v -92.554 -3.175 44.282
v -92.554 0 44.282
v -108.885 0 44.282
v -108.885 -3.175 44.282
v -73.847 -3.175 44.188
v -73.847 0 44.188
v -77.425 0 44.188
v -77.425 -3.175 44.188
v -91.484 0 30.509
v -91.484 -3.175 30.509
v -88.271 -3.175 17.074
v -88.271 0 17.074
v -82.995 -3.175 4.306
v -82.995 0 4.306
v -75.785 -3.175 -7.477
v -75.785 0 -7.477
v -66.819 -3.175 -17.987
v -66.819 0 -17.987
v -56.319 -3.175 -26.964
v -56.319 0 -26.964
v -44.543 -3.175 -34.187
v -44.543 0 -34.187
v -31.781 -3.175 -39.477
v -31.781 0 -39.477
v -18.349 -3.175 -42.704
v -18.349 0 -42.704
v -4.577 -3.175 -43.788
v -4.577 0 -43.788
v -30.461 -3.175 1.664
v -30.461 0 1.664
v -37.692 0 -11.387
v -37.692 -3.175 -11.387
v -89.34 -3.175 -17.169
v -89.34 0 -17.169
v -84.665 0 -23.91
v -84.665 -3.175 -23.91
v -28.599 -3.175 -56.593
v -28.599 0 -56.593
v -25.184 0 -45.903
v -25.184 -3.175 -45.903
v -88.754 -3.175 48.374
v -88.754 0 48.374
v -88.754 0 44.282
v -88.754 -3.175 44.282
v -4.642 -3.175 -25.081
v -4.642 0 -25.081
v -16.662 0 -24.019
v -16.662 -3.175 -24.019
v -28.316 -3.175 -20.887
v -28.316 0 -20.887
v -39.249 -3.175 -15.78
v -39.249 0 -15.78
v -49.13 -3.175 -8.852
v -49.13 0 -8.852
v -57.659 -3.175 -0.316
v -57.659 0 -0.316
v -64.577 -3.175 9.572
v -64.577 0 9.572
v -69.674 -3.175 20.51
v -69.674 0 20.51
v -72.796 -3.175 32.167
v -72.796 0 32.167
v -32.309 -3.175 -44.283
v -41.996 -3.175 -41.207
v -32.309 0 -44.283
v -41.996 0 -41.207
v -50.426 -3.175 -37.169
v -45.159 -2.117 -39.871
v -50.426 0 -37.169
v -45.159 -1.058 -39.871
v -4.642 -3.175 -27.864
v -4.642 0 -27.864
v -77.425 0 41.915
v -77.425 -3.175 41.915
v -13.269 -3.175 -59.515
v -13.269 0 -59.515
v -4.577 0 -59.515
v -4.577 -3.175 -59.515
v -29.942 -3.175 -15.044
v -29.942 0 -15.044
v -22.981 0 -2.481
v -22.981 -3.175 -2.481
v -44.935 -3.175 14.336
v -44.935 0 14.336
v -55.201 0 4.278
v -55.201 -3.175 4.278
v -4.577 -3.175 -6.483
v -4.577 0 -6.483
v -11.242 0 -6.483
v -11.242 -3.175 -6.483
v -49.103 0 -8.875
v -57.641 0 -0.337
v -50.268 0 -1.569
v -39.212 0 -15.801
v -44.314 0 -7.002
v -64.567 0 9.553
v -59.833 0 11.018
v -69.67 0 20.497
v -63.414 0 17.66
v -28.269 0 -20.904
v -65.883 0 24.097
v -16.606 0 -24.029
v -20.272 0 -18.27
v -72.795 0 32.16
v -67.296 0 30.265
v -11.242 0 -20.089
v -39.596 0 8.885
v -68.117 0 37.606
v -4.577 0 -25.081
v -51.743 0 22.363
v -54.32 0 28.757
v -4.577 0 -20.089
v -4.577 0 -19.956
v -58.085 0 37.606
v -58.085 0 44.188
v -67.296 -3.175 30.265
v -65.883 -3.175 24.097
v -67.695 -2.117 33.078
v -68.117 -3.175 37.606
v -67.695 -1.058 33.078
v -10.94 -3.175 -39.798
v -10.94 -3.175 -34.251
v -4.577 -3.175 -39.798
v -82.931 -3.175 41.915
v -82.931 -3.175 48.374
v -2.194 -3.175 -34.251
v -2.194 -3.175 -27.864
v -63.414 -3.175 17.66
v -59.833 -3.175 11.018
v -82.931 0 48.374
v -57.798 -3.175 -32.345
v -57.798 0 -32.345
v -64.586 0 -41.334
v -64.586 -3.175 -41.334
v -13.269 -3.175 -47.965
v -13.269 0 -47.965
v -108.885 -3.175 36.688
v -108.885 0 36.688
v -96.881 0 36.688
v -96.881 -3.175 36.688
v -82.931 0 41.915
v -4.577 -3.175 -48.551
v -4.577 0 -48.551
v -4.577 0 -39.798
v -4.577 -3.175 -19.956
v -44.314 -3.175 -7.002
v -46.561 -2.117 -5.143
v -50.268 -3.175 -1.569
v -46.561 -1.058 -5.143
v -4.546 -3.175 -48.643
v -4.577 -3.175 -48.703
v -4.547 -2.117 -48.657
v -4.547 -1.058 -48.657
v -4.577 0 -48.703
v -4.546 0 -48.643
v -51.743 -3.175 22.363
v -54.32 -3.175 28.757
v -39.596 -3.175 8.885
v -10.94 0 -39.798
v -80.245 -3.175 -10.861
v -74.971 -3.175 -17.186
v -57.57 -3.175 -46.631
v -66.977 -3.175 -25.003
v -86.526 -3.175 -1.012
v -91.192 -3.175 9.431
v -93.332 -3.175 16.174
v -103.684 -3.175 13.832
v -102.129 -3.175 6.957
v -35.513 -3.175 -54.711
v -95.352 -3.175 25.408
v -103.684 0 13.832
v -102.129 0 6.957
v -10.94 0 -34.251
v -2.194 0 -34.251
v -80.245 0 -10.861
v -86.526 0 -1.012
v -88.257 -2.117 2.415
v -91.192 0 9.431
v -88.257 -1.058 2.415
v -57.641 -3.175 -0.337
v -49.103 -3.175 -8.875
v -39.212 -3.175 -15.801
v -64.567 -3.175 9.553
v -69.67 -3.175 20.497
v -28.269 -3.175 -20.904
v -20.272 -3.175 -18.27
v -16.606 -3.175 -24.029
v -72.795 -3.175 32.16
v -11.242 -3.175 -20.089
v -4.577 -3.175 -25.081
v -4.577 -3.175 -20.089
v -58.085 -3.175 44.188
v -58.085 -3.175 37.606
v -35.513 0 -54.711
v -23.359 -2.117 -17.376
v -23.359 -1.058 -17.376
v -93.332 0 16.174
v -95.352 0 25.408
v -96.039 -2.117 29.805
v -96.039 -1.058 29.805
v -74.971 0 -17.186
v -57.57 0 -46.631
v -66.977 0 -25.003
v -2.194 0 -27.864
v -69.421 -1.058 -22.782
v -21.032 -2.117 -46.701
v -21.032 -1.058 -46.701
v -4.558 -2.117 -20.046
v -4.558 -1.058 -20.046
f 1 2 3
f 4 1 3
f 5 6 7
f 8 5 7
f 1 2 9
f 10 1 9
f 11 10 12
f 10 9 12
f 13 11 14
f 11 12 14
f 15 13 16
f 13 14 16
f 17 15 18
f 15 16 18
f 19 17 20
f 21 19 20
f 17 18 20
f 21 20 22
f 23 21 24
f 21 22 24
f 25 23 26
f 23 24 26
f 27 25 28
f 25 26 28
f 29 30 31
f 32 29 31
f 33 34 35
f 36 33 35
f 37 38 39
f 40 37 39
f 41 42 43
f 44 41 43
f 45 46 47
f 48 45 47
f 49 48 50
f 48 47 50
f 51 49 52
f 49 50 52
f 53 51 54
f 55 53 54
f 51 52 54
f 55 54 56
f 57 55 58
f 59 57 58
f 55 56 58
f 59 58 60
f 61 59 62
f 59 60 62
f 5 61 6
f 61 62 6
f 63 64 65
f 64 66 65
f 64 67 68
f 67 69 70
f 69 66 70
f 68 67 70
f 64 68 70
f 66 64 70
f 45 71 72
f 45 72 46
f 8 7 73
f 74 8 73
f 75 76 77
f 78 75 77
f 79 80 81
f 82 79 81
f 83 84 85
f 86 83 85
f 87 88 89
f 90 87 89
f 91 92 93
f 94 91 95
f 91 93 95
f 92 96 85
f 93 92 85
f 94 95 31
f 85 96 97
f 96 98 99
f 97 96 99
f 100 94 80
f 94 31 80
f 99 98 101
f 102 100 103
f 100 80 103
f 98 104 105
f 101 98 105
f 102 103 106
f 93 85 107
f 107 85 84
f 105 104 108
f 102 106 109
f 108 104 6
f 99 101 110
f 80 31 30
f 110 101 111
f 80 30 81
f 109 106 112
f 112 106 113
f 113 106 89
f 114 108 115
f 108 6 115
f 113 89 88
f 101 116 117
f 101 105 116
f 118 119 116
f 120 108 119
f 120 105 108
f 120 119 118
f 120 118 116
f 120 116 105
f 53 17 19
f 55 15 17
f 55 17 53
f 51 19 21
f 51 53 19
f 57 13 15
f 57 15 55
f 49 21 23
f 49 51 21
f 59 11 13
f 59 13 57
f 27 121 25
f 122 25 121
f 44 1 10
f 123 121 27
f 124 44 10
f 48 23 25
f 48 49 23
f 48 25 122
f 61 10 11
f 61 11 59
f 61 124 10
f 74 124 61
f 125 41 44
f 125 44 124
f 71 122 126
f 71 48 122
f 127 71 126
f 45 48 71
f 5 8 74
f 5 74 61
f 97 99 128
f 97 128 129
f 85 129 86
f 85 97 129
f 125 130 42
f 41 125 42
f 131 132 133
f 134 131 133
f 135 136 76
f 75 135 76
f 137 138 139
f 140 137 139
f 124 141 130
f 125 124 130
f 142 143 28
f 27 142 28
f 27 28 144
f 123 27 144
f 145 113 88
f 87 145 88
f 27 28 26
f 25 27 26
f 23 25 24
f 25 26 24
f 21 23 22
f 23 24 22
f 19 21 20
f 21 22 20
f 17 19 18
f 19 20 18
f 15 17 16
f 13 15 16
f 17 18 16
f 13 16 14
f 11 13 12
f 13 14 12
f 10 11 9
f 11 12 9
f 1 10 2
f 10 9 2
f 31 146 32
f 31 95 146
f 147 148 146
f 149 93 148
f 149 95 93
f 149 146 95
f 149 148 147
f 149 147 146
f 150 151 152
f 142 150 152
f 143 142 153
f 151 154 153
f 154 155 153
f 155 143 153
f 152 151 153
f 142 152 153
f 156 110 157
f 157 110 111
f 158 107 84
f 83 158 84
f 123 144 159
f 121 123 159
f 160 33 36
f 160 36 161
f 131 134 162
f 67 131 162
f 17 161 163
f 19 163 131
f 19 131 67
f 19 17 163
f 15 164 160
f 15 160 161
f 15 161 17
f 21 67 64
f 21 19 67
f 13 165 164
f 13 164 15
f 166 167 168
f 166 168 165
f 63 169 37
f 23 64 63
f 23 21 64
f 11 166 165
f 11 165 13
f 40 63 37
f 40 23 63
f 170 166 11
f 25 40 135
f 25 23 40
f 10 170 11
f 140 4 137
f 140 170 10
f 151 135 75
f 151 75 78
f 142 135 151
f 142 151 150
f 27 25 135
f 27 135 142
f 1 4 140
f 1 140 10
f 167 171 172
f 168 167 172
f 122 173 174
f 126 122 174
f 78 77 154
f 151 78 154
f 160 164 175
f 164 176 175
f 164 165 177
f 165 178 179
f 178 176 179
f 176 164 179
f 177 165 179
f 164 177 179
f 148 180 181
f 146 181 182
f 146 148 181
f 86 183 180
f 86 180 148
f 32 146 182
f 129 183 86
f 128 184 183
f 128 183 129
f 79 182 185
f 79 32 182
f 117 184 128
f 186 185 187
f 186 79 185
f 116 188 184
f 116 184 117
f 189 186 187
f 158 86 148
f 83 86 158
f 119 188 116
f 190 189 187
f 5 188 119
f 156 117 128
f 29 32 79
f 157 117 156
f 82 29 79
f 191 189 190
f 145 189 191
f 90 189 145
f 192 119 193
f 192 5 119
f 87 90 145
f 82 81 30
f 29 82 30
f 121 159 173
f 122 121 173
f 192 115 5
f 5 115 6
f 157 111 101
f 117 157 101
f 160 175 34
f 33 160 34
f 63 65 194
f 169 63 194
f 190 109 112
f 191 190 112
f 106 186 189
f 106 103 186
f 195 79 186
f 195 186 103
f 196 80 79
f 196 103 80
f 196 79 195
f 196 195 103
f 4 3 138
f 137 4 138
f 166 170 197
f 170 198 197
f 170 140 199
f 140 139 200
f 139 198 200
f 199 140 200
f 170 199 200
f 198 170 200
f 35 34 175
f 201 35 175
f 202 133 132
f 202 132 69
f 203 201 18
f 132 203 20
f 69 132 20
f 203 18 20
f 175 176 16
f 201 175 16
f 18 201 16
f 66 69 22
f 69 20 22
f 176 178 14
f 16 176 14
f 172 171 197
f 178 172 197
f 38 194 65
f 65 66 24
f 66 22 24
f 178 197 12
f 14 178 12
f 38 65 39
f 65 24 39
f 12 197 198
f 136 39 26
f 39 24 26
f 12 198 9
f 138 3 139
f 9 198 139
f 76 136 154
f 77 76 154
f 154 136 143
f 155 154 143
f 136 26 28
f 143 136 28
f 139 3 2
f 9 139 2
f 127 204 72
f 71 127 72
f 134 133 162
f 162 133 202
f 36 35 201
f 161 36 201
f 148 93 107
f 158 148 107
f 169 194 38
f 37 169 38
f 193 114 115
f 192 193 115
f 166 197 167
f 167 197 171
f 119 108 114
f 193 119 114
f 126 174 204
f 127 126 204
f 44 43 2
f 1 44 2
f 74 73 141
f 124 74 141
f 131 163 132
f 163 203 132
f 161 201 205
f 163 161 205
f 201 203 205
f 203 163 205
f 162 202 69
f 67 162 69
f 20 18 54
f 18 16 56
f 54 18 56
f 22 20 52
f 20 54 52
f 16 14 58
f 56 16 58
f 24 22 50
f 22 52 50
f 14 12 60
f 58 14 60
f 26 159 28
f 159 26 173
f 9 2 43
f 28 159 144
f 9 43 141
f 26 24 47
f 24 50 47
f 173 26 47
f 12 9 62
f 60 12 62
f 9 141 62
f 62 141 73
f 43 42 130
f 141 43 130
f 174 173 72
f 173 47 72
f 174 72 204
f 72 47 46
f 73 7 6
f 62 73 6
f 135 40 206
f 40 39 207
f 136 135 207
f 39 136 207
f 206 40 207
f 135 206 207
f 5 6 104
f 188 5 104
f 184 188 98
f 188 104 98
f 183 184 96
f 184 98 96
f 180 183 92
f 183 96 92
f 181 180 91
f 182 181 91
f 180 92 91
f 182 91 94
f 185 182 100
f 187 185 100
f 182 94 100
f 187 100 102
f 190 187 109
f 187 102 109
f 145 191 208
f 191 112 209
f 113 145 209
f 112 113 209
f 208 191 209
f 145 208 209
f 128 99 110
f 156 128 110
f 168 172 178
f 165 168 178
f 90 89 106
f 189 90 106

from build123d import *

# Parameters (mm, degrees)
F1_DEPTH = 3.175
F3_DEPTH = 3.175


# Not quite as in the source:
# - ends of sketch curves that miss each other by under 0.0002 mm in the source are joined


with BuildPart() as f1:
    # F0 (on Front) → F1 (new body)
    with BuildSketch(Plane.XZ):
        with BuildLine():
            ThreePointArc((-4.57723355, -43.7883980573), (-66.819423743, -17.9873487673), (-92.5539227851, 44.2823866067))
            Line((-92.5539227851, 44.2823866067), (-97.6339227851, 44.2823866067))
            add(Edge.make_bspline(
                [(-97.6339227851, 44.2823866067), (-97.3931684107, 41.7497203339), (-97.1524140363, 39.2170540611), (-96.8805696251, 36.6884975094)],
                knots=[0, 0, 0, 0, 0.0522468531, 0.0522468531, 0.0522468531, 0.0522468531], degree=3))
            add(Edge.make_bspline(
                [(-96.8805696251, 36.6884975094), (-96.1391179528, 29.7918963404), (-95.1663820006, 22.9258681136), (-93.3315372634, 16.1738000838)],
                knots=[0.0522468531, 0.0522468531, 0.0522468531, 0.0522468531, 0.194749384, 0.194749384, 0.194749384, 0.194749384], degree=3))
            add(Edge.make_bspline(
                [(-93.3315372634, 16.1738000838), (-92.7163937389, 13.910125757), (-92.0043518732, 11.6592602013), (-91.1919757647, 9.4312911762)],
                knots=[0.194749384, 0.194749384, 0.194749384, 0.194749384, 0.242524276, 0.242524276, 0.242524276, 0.242524276], degree=3))
            add(Edge.make_bspline(
                [(-91.1919757647, 9.4312911762), (-88.6009408677, 2.3252901097), (-84.9892452149, -4.5477935635), (-80.2454108338, -10.8606620469)],
                knots=[0.242524276, 0.242524276, 0.242524276, 0.242524276, 0.394900018, 0.394900018, 0.394900018, 0.394900018], degree=3))
            add(Edge.make_bspline(
                [(-80.2454108338, -10.8606620469), (-78.607242384, -13.0406584688), (-76.8340664871, -15.1538492769), (-74.9712769181, -17.1861090489)],
                knots=[0.394900018, 0.394900018, 0.394900018, 0.394900018, 0.4475192945, 0.4475192945, 0.4475192945, 0.4475192945], degree=3))
            add(Edge.make_bspline(
                [(-74.9712769181, -17.1861090489), (-69.6272612199, -23.016304958), (-63.5457113797, -28.1804261391), (-57.7984134089, -32.3449592406)],
                knots=[0.4475192945, 0.4475192945, 0.4475192945, 0.4475192945, 0.5984747456, 0.5984747456, 0.5984747456, 0.5984747456], degree=3))
            add(Edge.make_bspline(
                [(-57.7984134089, -32.3449592406), (-55.3415292823, -34.1252350021), (-52.9457275098, -35.7228425466), (-50.4258841879, -37.168898271)],
                knots=[0.5984747456, 0.5984747456, 0.5984747456, 0.5984747456, 0.6630059486, 0.6630059486, 0.6630059486, 0.6630059486], degree=3))
            add(Edge.make_bspline(
                [(-50.4258841879, -37.168898271), (-45.3798949167, -40.0646265916), (-39.8364976619, -42.3526304388), (-32.3091378654, -44.2827760941)],
                knots=[0.6630059486, 0.6630059486, 0.6630059486, 0.6630059486, 0.7922297598, 0.7922297598, 0.7922297598, 0.7922297598], degree=3))
            add(Edge.make_bspline(
                [(-32.3091378654, -44.2827760941), (-30.0596561185, -44.8595822437), (-27.6329950376, -45.4044295862), (-25.1835874199, -45.9026667789)],
                knots=[0.7922297598, 0.7922297598, 0.7922297598, 0.7922297598, 0.8308470987, 0.8308470987, 0.8308470987, 0.8308470987], degree=3))
            add(Edge.make_bspline(
                [(-25.1835874199, -45.9026667789), (-21.0258896893, -46.7483894877), (-16.802653084, -47.4598158509), (-13.2691699484, -47.9652898008)],
                knots=[0.8308470987, 0.8308470987, 0.8308470987, 0.8308470987, 0.8963973245, 0.8963973245, 0.8963973245, 0.8963973245], degree=3))
            add(Edge.make_bspline(
                [(-13.2691699484, -47.9652898008), (-8.4519136222, -48.6544108435), (-4.916655331, -48.9607420913), (-4.57723355, -48.70271393)],
                knots=[0.8963973245, 0.8963973245, 0.8963973245, 0.8963973245, 0.9857630376, 0.9857630376, 0.9857630376, 0.9857630376], degree=3))
            Line((-4.57723355, -48.70271393), (-4.57723355, -48.5507466091))
            Line((-4.57723355, -48.5507466091), (-4.57723355, -43.7883980573))
        make_face()
        with BuildLine():
            add(Edge.make_bspline(
                [(-97.6339227851, 44.2823866067), (-97.3931684107, 41.7497203339), (-97.1524140363, 39.2170540611), (-96.8805696251, 36.6884975094)],
                knots=[0, 0, 0, 0, 0.0522468531, 0.0522468531, 0.0522468531, 0.0522468531], degree=3))
            Line((-97.6339227851, 44.2823866067), (-108.8849874868, 44.2823866067))
            Line((-108.8849874868, 44.2823866067), (-108.8849874868, 36.6884975094))
            Line((-108.8849874868, 36.6884975094), (-96.8805696251, 36.6884975094))
        make_face()
        with BuildLine():
            add(Edge.make_bspline(
                [(-4.57723355, -48.70271393), (-4.5231598458, -48.6616071441), (-4.5501966979, -48.6061768766), (-4.57723355, -48.5507466091)],
                knots=[0.9857630376, 0.9857630376, 0.9857630376, 0.9857630376, 1, 1, 1, 1], degree=3))
            Line((-4.57723355, -48.5507466091), (-4.57723355, -48.70271393))
        make_face()
        with BuildLine():
            Line((-4.57723355, -59.5153173973), (-4.57723355, -48.70271393))
            add(Edge.make_bspline(
                [(-13.2691699484, -47.9652898008), (-8.4519136222, -48.6544108435), (-4.916655331, -48.9607420913), (-4.57723355, -48.70271393)],
                knots=[0.8963973245, 0.8963973245, 0.8963973245, 0.8963973245, 0.9857630376, 0.9857630376, 0.9857630376, 0.9857630376], degree=3))
            Line((-13.2691699484, -47.9652898008), (-13.2691699484, -59.5153173973))
            Line((-13.2691699484, -59.5153173973), (-4.57723355, -59.5153173973))
        make_face()
        with BuildLine():
            add(Edge.make_bspline(
                [(-93.3315372634, 16.1738000838), (-92.7163937389, 13.910125757), (-92.0043518732, 11.6592602013), (-91.1919757647, 9.4312911762)],
                knots=[0.194749384, 0.194749384, 0.194749384, 0.194749384, 0.242524276, 0.242524276, 0.242524276, 0.242524276], degree=3))
            Line((-93.3315372634, 16.1738000838), (-103.6843064573, 13.8317355646))
            Line((-103.6843064573, 13.8317355646), (-102.1290715587, 6.9570368465))
            Line((-102.1290715587, 6.9570368465), (-91.1919757647, 9.4312911762))
        make_face()
        with BuildLine():
            Line((-28.5986802118, -56.592917115), (-25.1835874199, -45.9026667789))
            add(Edge.make_bspline(
                [(-32.3091378654, -44.2827760941), (-30.0596561185, -44.8595822437), (-27.6329950376, -45.4044295862), (-25.1835874199, -45.9026667789)],
                knots=[0.7922297598, 0.7922297598, 0.7922297598, 0.7922297598, 0.8308470987, 0.8308470987, 0.8308470987, 0.8308470987], degree=3))
            Line((-32.3091378654, -44.2827760941), (-35.5125362565, -54.710556085))
            Line((-35.5125362565, -54.710556085), (-28.5986802118, -56.592917115))
        make_face()
        with BuildLine():
            add(Edge.make_bspline(
                [(-80.2454108338, -10.8606620469), (-78.607242384, -13.0406584688), (-76.8340664871, -15.1538492769), (-74.9712769181, -17.1861090489)],
                knots=[0.394900018, 0.394900018, 0.394900018, 0.394900018, 0.4475192945, 0.4475192945, 0.4475192945, 0.4475192945], degree=3))
            Line((-80.2454108338, -10.8606620469), (-89.3403956863, -17.1692187548))
            Line((-89.3403956863, -17.1692187548), (-84.6648700593, -23.9098785797))
            Line((-84.6648700593, -23.9098785797), (-74.9712769181, -17.1861090489))
        make_face()
        with BuildLine():
            Line((-57.5702740184, -46.6306970593), (-50.4258841879, -37.168898271))
            add(Edge.make_bspline(
                [(-57.7984134089, -32.3449592406), (-55.3415292823, -34.1252350021), (-52.9457275098, -35.7228425466), (-50.4258841879, -37.168898271)],
                knots=[0.5984747456, 0.5984747456, 0.5984747456, 0.5984747456, 0.6630059486, 0.6630059486, 0.6630059486, 0.6630059486], degree=3))
            Line((-57.7984134089, -32.3449592406), (-64.5855489224, -41.3336219678))
            Line((-64.5855489224, -41.3336219678), (-57.5702740184, -46.6306970593))
        make_face()
    extrude(amount=F1_DEPTH)


with BuildPart() as f1b:
    # F0 (on Front) → F1, piece 2 (new body)
    with BuildSketch(Plane.XZ):
        with BuildLine():
            Line((-68.460035245, 44.188341444), (-73.8470553452, 44.188341444))
            ThreePointArc((-73.8470553452, 44.188341444), (-53.5583942729, -4.792819279), (-4.57723355, -25.0814803512))
            Line((-4.57723355, -25.0814803512), (-4.57723355, -20.089340043))
            add(Edge.make_bspline(
                [(-11.2417986909, -20.089340043), (-7.6185165541, -20.5216548463), (-4.8185609122, -20.3880627705), (-4.57723355, -20.089340043)],
                knots=[0.8679520206, 0.8679520206, 0.8679520206, 0.8679520206, 0.9836335446, 0.9836335446, 0.9836335446, 0.9836335446], degree=3))
            add(Edge.make_bspline(
                [(-29.9419627206, -15.043763619), (-23.422756241, -17.6607776775), (-16.4738824823, -19.4650697847), (-11.2417986909, -20.089340043)],
                knots=[0.7009058442, 0.7009058442, 0.7009058442, 0.7009058442, 0.8679520206, 0.8679520206, 0.8679520206, 0.8679520206], degree=3))
            add(Edge.make_bspline(
                [(-37.6919303949, -11.3869210218), (-35.2854498907, -12.7286211423), (-32.6507981172, -13.9563520855), (-29.9419627206, -15.043763619)],
                knots=[0.6314954647, 0.6314954647, 0.6314954647, 0.6314954647, 0.7009058442, 0.7009058442, 0.7009058442, 0.7009058442], degree=3))
            add(Edge.make_bspline(
                [(-50.2679967336, -1.5694799865), (-46.7502062379, -5.2841732571), (-42.7188946441, -8.5842062158), (-37.6919303949, -11.3869210218)],
                knots=[0.486502187, 0.486502187, 0.486502187, 0.486502187, 0.6314954647, 0.6314954647, 0.6314954647, 0.6314954647], degree=3))
            add(Edge.make_bspline(
                [(-55.2009748713, 4.2784686576), (-53.6443043314, 2.2331240714), (-52.019825963, 0.2804051212), (-50.2679967336, -1.5694799865)],
                knots=[0.4142967892, 0.4142967892, 0.4142967892, 0.4142967892, 0.486502187, 0.486502187, 0.486502187, 0.486502187], degree=3))
            add(Edge.make_bspline(
                [(-63.4136220682, 17.660311036), (-61.2402617068, 12.9621183463), (-58.3602666711, 8.429533519), (-55.2009748713, 4.2784686576)],
                knots=[0.2677545922, 0.2677545922, 0.2677545922, 0.2677545922, 0.4142967892, 0.4142967892, 0.4142967892, 0.4142967892], degree=3))
            add(Edge.make_bspline(
                [(-65.8834584942, 24.0971257956), (-65.2299828846, 21.9310450164), (-64.3936435193, 19.7788412618), (-63.4136220682, 17.660311036)],
                knots=[0.2016751241, 0.2016751241, 0.2016751241, 0.2016751241, 0.2677545922, 0.2677545922, 0.2677545922, 0.2677545922], degree=3))
            add(Edge.make_bspline(
                [(-68.1166645486, 37.6055160739), (-67.7985284224, 33.0703711751), (-67.2281449465, 28.5543686299), (-65.8834584942, 24.0971257956)],
                knots=[0.0657004003, 0.0657004003, 0.0657004003, 0.0657004003, 0.2016751241, 0.2016751241, 0.2016751241, 0.2016751241], degree=3))
            add(Edge.make_bspline(
                [(-68.460035245, 44.188341444), (-68.3652085595, 41.992576638), (-68.270381874, 39.7968118321), (-68.1166645486, 37.6055160739)],
                knots=[0, 0, 0, 0, 0.0657004003, 0.0657004003, 0.0657004003, 0.0657004003], degree=3))
        make_face()
        with BuildLine():
            Line((-58.0849874868, 44.188341444), (-68.460035245, 44.188341444))
            add(Edge.make_bspline(
                [(-68.460035245, 44.188341444), (-68.3652085595, 41.992576638), (-68.270381874, 39.7968118321), (-68.1166645486, 37.6055160739)],
                knots=[0, 0, 0, 0, 0.0657004003, 0.0657004003, 0.0657004003, 0.0657004003], degree=3))
            Line((-68.1166645486, 37.6055160739), (-58.0849874868, 37.6055160739))
            Line((-58.0849874868, 37.6055160739), (-58.0849874868, 44.188341444))
        make_face()
        with BuildLine():
            add(Edge.make_bspline(
                [(-11.2417986909, -20.089340043), (-7.6185165541, -20.5216548463), (-4.8185609122, -20.3880627705), (-4.57723355, -20.089340043)],
                knots=[0.8679520206, 0.8679520206, 0.8679520206, 0.8679520206, 0.9836335446, 0.9836335446, 0.9836335446, 0.9836335446], degree=3))
            Line((-4.57723355, -20.089340043), (-4.57723355, -19.9559408889))
            Line((-4.57723355, -19.9559408889), (-4.57723355, -6.4825667786))
            Line((-4.57723355, -6.4825667786), (-11.2417986909, -6.4825667786))
            Line((-11.2417986909, -6.4825667786), (-11.2417986909, -20.089340043))
        make_face()
        with BuildLine():
            Line((-4.57723355, -19.9559408889), (-4.57723355, -20.089340043))
            add(Edge.make_bspline(
                [(-4.57723355, -20.089340043), (-4.5430909024, -20.0470771818), (-4.5601622262, -20.0015090354), (-4.57723355, -19.9559408889)],
                knots=[0.9836335446, 0.9836335446, 0.9836335446, 0.9836335446, 1, 1, 1, 1], degree=3))
        make_face()
        with BuildLine():
            Line((-54.3195477878, 28.7565803399), (-65.8834584942, 24.0971257956))
            add(Edge.make_bspline(
                [(-65.8834584942, 24.0971257956), (-65.2299828846, 21.9310450164), (-64.3936435193, 19.7788412618), (-63.4136220682, 17.660311036)],
                knots=[0.2016751241, 0.2016751241, 0.2016751241, 0.2016751241, 0.2677545922, 0.2677545922, 0.2677545922, 0.2677545922], degree=3))
            Line((-63.4136220682, 17.660311036), (-51.7432430301, 22.3626649389))
            Line((-51.7432430301, 22.3626649389), (-54.3195477878, 28.7565803399))
        make_face()
        with BuildLine():
            add(Edge.make_bspline(
                [(-37.6919303949, -11.3869210218), (-35.2854498907, -12.7286211423), (-32.6507981172, -13.9563520855), (-29.9419627206, -15.043763619)],
                knots=[0.6314954647, 0.6314954647, 0.6314954647, 0.6314954647, 0.7009058442, 0.7009058442, 0.7009058442, 0.7009058442], degree=3))
            Line((-29.9419627206, -15.043763619), (-22.9809752827, -2.4805746691))
            Line((-22.9809752827, -2.4805746691), (-30.460795653, 1.6638297367))
            Line((-30.460795653, 1.6638297367), (-37.6919303949, -11.3869210218))
        make_face()
        with BuildLine():
            Line((-44.9346528444, 14.3355632134), (-55.2009748713, 4.2784686576))
            add(Edge.make_bspline(
                [(-55.2009748713, 4.2784686576), (-53.6443043314, 2.2331240714), (-52.019825963, 0.2804051212), (-50.2679967336, -1.5694799865)],
                knots=[0.4142967892, 0.4142967892, 0.4142967892, 0.4142967892, 0.486502187, 0.486502187, 0.486502187, 0.486502187], degree=3))
            Line((-50.2679967336, -1.5694799865), (-39.5955882998, 8.8854249421))
            Line((-39.5955882998, 8.8854249421), (-44.9346528444, 14.3355632134))
        make_face()
    extrude(amount=F1_DEPTH)


with BuildPart() as f3:
    # F2 (on Front) → F3 (new body)
    with BuildSketch(Plane.XZ):
        with BuildLine():
            Line((-88.7539610267, 44.2823866067), (-92.5539227851, 44.2823866067))
            ThreePointArc((-92.5539227851, 44.2823866067), (-66.819423743, -17.9873487673), (-4.57723355, -43.7883980573))
            Line((-4.57723355, -43.7883980573), (-4.57723355, -39.7976860404))
            Line((-4.57723355, -39.7976860404), (-10.9395096079, -39.7976860404))
            Line((-10.9395096079, -39.7976860404), (-10.9395096079, -34.2512689531))
            Line((-10.9395096079, -34.2512689531), (-2.193643013, -34.2512689531))
            Line((-2.193643013, -34.2512689531), (-2.193643013, -27.864491567))
            Line((-2.193643013, -27.864491567), (-4.6415692195, -27.864491567))
            Line((-4.6415692195, -27.864491567), (-4.6415692195, -25.0813551247))
            ThreePointArc((-4.6415692195, -25.0813551247), (-53.5811351193, -4.7700678696), (-73.8470553452, 44.188341444))
            Line((-73.8470553452, 44.188341444), (-77.4248614907, 44.188341444))
            Line((-77.4248614907, 44.188341444), (-77.4248614907, 41.9153422117))
            Line((-77.4248614907, 41.9153422117), (-82.9305946827, 41.9153422117))
            Line((-82.9305946827, 41.9153422117), (-82.9305946827, 48.3739897609))
            Line((-82.9305946827, 48.3739897609), (-88.7539610267, 48.3739897609))
            Line((-88.7539610267, 48.3739897609), (-88.7539610267, 44.2823866067))
        make_face()
    extrude(amount=F3_DEPTH)


solid = Compound([f1.part, f1b.part, f3.part])
